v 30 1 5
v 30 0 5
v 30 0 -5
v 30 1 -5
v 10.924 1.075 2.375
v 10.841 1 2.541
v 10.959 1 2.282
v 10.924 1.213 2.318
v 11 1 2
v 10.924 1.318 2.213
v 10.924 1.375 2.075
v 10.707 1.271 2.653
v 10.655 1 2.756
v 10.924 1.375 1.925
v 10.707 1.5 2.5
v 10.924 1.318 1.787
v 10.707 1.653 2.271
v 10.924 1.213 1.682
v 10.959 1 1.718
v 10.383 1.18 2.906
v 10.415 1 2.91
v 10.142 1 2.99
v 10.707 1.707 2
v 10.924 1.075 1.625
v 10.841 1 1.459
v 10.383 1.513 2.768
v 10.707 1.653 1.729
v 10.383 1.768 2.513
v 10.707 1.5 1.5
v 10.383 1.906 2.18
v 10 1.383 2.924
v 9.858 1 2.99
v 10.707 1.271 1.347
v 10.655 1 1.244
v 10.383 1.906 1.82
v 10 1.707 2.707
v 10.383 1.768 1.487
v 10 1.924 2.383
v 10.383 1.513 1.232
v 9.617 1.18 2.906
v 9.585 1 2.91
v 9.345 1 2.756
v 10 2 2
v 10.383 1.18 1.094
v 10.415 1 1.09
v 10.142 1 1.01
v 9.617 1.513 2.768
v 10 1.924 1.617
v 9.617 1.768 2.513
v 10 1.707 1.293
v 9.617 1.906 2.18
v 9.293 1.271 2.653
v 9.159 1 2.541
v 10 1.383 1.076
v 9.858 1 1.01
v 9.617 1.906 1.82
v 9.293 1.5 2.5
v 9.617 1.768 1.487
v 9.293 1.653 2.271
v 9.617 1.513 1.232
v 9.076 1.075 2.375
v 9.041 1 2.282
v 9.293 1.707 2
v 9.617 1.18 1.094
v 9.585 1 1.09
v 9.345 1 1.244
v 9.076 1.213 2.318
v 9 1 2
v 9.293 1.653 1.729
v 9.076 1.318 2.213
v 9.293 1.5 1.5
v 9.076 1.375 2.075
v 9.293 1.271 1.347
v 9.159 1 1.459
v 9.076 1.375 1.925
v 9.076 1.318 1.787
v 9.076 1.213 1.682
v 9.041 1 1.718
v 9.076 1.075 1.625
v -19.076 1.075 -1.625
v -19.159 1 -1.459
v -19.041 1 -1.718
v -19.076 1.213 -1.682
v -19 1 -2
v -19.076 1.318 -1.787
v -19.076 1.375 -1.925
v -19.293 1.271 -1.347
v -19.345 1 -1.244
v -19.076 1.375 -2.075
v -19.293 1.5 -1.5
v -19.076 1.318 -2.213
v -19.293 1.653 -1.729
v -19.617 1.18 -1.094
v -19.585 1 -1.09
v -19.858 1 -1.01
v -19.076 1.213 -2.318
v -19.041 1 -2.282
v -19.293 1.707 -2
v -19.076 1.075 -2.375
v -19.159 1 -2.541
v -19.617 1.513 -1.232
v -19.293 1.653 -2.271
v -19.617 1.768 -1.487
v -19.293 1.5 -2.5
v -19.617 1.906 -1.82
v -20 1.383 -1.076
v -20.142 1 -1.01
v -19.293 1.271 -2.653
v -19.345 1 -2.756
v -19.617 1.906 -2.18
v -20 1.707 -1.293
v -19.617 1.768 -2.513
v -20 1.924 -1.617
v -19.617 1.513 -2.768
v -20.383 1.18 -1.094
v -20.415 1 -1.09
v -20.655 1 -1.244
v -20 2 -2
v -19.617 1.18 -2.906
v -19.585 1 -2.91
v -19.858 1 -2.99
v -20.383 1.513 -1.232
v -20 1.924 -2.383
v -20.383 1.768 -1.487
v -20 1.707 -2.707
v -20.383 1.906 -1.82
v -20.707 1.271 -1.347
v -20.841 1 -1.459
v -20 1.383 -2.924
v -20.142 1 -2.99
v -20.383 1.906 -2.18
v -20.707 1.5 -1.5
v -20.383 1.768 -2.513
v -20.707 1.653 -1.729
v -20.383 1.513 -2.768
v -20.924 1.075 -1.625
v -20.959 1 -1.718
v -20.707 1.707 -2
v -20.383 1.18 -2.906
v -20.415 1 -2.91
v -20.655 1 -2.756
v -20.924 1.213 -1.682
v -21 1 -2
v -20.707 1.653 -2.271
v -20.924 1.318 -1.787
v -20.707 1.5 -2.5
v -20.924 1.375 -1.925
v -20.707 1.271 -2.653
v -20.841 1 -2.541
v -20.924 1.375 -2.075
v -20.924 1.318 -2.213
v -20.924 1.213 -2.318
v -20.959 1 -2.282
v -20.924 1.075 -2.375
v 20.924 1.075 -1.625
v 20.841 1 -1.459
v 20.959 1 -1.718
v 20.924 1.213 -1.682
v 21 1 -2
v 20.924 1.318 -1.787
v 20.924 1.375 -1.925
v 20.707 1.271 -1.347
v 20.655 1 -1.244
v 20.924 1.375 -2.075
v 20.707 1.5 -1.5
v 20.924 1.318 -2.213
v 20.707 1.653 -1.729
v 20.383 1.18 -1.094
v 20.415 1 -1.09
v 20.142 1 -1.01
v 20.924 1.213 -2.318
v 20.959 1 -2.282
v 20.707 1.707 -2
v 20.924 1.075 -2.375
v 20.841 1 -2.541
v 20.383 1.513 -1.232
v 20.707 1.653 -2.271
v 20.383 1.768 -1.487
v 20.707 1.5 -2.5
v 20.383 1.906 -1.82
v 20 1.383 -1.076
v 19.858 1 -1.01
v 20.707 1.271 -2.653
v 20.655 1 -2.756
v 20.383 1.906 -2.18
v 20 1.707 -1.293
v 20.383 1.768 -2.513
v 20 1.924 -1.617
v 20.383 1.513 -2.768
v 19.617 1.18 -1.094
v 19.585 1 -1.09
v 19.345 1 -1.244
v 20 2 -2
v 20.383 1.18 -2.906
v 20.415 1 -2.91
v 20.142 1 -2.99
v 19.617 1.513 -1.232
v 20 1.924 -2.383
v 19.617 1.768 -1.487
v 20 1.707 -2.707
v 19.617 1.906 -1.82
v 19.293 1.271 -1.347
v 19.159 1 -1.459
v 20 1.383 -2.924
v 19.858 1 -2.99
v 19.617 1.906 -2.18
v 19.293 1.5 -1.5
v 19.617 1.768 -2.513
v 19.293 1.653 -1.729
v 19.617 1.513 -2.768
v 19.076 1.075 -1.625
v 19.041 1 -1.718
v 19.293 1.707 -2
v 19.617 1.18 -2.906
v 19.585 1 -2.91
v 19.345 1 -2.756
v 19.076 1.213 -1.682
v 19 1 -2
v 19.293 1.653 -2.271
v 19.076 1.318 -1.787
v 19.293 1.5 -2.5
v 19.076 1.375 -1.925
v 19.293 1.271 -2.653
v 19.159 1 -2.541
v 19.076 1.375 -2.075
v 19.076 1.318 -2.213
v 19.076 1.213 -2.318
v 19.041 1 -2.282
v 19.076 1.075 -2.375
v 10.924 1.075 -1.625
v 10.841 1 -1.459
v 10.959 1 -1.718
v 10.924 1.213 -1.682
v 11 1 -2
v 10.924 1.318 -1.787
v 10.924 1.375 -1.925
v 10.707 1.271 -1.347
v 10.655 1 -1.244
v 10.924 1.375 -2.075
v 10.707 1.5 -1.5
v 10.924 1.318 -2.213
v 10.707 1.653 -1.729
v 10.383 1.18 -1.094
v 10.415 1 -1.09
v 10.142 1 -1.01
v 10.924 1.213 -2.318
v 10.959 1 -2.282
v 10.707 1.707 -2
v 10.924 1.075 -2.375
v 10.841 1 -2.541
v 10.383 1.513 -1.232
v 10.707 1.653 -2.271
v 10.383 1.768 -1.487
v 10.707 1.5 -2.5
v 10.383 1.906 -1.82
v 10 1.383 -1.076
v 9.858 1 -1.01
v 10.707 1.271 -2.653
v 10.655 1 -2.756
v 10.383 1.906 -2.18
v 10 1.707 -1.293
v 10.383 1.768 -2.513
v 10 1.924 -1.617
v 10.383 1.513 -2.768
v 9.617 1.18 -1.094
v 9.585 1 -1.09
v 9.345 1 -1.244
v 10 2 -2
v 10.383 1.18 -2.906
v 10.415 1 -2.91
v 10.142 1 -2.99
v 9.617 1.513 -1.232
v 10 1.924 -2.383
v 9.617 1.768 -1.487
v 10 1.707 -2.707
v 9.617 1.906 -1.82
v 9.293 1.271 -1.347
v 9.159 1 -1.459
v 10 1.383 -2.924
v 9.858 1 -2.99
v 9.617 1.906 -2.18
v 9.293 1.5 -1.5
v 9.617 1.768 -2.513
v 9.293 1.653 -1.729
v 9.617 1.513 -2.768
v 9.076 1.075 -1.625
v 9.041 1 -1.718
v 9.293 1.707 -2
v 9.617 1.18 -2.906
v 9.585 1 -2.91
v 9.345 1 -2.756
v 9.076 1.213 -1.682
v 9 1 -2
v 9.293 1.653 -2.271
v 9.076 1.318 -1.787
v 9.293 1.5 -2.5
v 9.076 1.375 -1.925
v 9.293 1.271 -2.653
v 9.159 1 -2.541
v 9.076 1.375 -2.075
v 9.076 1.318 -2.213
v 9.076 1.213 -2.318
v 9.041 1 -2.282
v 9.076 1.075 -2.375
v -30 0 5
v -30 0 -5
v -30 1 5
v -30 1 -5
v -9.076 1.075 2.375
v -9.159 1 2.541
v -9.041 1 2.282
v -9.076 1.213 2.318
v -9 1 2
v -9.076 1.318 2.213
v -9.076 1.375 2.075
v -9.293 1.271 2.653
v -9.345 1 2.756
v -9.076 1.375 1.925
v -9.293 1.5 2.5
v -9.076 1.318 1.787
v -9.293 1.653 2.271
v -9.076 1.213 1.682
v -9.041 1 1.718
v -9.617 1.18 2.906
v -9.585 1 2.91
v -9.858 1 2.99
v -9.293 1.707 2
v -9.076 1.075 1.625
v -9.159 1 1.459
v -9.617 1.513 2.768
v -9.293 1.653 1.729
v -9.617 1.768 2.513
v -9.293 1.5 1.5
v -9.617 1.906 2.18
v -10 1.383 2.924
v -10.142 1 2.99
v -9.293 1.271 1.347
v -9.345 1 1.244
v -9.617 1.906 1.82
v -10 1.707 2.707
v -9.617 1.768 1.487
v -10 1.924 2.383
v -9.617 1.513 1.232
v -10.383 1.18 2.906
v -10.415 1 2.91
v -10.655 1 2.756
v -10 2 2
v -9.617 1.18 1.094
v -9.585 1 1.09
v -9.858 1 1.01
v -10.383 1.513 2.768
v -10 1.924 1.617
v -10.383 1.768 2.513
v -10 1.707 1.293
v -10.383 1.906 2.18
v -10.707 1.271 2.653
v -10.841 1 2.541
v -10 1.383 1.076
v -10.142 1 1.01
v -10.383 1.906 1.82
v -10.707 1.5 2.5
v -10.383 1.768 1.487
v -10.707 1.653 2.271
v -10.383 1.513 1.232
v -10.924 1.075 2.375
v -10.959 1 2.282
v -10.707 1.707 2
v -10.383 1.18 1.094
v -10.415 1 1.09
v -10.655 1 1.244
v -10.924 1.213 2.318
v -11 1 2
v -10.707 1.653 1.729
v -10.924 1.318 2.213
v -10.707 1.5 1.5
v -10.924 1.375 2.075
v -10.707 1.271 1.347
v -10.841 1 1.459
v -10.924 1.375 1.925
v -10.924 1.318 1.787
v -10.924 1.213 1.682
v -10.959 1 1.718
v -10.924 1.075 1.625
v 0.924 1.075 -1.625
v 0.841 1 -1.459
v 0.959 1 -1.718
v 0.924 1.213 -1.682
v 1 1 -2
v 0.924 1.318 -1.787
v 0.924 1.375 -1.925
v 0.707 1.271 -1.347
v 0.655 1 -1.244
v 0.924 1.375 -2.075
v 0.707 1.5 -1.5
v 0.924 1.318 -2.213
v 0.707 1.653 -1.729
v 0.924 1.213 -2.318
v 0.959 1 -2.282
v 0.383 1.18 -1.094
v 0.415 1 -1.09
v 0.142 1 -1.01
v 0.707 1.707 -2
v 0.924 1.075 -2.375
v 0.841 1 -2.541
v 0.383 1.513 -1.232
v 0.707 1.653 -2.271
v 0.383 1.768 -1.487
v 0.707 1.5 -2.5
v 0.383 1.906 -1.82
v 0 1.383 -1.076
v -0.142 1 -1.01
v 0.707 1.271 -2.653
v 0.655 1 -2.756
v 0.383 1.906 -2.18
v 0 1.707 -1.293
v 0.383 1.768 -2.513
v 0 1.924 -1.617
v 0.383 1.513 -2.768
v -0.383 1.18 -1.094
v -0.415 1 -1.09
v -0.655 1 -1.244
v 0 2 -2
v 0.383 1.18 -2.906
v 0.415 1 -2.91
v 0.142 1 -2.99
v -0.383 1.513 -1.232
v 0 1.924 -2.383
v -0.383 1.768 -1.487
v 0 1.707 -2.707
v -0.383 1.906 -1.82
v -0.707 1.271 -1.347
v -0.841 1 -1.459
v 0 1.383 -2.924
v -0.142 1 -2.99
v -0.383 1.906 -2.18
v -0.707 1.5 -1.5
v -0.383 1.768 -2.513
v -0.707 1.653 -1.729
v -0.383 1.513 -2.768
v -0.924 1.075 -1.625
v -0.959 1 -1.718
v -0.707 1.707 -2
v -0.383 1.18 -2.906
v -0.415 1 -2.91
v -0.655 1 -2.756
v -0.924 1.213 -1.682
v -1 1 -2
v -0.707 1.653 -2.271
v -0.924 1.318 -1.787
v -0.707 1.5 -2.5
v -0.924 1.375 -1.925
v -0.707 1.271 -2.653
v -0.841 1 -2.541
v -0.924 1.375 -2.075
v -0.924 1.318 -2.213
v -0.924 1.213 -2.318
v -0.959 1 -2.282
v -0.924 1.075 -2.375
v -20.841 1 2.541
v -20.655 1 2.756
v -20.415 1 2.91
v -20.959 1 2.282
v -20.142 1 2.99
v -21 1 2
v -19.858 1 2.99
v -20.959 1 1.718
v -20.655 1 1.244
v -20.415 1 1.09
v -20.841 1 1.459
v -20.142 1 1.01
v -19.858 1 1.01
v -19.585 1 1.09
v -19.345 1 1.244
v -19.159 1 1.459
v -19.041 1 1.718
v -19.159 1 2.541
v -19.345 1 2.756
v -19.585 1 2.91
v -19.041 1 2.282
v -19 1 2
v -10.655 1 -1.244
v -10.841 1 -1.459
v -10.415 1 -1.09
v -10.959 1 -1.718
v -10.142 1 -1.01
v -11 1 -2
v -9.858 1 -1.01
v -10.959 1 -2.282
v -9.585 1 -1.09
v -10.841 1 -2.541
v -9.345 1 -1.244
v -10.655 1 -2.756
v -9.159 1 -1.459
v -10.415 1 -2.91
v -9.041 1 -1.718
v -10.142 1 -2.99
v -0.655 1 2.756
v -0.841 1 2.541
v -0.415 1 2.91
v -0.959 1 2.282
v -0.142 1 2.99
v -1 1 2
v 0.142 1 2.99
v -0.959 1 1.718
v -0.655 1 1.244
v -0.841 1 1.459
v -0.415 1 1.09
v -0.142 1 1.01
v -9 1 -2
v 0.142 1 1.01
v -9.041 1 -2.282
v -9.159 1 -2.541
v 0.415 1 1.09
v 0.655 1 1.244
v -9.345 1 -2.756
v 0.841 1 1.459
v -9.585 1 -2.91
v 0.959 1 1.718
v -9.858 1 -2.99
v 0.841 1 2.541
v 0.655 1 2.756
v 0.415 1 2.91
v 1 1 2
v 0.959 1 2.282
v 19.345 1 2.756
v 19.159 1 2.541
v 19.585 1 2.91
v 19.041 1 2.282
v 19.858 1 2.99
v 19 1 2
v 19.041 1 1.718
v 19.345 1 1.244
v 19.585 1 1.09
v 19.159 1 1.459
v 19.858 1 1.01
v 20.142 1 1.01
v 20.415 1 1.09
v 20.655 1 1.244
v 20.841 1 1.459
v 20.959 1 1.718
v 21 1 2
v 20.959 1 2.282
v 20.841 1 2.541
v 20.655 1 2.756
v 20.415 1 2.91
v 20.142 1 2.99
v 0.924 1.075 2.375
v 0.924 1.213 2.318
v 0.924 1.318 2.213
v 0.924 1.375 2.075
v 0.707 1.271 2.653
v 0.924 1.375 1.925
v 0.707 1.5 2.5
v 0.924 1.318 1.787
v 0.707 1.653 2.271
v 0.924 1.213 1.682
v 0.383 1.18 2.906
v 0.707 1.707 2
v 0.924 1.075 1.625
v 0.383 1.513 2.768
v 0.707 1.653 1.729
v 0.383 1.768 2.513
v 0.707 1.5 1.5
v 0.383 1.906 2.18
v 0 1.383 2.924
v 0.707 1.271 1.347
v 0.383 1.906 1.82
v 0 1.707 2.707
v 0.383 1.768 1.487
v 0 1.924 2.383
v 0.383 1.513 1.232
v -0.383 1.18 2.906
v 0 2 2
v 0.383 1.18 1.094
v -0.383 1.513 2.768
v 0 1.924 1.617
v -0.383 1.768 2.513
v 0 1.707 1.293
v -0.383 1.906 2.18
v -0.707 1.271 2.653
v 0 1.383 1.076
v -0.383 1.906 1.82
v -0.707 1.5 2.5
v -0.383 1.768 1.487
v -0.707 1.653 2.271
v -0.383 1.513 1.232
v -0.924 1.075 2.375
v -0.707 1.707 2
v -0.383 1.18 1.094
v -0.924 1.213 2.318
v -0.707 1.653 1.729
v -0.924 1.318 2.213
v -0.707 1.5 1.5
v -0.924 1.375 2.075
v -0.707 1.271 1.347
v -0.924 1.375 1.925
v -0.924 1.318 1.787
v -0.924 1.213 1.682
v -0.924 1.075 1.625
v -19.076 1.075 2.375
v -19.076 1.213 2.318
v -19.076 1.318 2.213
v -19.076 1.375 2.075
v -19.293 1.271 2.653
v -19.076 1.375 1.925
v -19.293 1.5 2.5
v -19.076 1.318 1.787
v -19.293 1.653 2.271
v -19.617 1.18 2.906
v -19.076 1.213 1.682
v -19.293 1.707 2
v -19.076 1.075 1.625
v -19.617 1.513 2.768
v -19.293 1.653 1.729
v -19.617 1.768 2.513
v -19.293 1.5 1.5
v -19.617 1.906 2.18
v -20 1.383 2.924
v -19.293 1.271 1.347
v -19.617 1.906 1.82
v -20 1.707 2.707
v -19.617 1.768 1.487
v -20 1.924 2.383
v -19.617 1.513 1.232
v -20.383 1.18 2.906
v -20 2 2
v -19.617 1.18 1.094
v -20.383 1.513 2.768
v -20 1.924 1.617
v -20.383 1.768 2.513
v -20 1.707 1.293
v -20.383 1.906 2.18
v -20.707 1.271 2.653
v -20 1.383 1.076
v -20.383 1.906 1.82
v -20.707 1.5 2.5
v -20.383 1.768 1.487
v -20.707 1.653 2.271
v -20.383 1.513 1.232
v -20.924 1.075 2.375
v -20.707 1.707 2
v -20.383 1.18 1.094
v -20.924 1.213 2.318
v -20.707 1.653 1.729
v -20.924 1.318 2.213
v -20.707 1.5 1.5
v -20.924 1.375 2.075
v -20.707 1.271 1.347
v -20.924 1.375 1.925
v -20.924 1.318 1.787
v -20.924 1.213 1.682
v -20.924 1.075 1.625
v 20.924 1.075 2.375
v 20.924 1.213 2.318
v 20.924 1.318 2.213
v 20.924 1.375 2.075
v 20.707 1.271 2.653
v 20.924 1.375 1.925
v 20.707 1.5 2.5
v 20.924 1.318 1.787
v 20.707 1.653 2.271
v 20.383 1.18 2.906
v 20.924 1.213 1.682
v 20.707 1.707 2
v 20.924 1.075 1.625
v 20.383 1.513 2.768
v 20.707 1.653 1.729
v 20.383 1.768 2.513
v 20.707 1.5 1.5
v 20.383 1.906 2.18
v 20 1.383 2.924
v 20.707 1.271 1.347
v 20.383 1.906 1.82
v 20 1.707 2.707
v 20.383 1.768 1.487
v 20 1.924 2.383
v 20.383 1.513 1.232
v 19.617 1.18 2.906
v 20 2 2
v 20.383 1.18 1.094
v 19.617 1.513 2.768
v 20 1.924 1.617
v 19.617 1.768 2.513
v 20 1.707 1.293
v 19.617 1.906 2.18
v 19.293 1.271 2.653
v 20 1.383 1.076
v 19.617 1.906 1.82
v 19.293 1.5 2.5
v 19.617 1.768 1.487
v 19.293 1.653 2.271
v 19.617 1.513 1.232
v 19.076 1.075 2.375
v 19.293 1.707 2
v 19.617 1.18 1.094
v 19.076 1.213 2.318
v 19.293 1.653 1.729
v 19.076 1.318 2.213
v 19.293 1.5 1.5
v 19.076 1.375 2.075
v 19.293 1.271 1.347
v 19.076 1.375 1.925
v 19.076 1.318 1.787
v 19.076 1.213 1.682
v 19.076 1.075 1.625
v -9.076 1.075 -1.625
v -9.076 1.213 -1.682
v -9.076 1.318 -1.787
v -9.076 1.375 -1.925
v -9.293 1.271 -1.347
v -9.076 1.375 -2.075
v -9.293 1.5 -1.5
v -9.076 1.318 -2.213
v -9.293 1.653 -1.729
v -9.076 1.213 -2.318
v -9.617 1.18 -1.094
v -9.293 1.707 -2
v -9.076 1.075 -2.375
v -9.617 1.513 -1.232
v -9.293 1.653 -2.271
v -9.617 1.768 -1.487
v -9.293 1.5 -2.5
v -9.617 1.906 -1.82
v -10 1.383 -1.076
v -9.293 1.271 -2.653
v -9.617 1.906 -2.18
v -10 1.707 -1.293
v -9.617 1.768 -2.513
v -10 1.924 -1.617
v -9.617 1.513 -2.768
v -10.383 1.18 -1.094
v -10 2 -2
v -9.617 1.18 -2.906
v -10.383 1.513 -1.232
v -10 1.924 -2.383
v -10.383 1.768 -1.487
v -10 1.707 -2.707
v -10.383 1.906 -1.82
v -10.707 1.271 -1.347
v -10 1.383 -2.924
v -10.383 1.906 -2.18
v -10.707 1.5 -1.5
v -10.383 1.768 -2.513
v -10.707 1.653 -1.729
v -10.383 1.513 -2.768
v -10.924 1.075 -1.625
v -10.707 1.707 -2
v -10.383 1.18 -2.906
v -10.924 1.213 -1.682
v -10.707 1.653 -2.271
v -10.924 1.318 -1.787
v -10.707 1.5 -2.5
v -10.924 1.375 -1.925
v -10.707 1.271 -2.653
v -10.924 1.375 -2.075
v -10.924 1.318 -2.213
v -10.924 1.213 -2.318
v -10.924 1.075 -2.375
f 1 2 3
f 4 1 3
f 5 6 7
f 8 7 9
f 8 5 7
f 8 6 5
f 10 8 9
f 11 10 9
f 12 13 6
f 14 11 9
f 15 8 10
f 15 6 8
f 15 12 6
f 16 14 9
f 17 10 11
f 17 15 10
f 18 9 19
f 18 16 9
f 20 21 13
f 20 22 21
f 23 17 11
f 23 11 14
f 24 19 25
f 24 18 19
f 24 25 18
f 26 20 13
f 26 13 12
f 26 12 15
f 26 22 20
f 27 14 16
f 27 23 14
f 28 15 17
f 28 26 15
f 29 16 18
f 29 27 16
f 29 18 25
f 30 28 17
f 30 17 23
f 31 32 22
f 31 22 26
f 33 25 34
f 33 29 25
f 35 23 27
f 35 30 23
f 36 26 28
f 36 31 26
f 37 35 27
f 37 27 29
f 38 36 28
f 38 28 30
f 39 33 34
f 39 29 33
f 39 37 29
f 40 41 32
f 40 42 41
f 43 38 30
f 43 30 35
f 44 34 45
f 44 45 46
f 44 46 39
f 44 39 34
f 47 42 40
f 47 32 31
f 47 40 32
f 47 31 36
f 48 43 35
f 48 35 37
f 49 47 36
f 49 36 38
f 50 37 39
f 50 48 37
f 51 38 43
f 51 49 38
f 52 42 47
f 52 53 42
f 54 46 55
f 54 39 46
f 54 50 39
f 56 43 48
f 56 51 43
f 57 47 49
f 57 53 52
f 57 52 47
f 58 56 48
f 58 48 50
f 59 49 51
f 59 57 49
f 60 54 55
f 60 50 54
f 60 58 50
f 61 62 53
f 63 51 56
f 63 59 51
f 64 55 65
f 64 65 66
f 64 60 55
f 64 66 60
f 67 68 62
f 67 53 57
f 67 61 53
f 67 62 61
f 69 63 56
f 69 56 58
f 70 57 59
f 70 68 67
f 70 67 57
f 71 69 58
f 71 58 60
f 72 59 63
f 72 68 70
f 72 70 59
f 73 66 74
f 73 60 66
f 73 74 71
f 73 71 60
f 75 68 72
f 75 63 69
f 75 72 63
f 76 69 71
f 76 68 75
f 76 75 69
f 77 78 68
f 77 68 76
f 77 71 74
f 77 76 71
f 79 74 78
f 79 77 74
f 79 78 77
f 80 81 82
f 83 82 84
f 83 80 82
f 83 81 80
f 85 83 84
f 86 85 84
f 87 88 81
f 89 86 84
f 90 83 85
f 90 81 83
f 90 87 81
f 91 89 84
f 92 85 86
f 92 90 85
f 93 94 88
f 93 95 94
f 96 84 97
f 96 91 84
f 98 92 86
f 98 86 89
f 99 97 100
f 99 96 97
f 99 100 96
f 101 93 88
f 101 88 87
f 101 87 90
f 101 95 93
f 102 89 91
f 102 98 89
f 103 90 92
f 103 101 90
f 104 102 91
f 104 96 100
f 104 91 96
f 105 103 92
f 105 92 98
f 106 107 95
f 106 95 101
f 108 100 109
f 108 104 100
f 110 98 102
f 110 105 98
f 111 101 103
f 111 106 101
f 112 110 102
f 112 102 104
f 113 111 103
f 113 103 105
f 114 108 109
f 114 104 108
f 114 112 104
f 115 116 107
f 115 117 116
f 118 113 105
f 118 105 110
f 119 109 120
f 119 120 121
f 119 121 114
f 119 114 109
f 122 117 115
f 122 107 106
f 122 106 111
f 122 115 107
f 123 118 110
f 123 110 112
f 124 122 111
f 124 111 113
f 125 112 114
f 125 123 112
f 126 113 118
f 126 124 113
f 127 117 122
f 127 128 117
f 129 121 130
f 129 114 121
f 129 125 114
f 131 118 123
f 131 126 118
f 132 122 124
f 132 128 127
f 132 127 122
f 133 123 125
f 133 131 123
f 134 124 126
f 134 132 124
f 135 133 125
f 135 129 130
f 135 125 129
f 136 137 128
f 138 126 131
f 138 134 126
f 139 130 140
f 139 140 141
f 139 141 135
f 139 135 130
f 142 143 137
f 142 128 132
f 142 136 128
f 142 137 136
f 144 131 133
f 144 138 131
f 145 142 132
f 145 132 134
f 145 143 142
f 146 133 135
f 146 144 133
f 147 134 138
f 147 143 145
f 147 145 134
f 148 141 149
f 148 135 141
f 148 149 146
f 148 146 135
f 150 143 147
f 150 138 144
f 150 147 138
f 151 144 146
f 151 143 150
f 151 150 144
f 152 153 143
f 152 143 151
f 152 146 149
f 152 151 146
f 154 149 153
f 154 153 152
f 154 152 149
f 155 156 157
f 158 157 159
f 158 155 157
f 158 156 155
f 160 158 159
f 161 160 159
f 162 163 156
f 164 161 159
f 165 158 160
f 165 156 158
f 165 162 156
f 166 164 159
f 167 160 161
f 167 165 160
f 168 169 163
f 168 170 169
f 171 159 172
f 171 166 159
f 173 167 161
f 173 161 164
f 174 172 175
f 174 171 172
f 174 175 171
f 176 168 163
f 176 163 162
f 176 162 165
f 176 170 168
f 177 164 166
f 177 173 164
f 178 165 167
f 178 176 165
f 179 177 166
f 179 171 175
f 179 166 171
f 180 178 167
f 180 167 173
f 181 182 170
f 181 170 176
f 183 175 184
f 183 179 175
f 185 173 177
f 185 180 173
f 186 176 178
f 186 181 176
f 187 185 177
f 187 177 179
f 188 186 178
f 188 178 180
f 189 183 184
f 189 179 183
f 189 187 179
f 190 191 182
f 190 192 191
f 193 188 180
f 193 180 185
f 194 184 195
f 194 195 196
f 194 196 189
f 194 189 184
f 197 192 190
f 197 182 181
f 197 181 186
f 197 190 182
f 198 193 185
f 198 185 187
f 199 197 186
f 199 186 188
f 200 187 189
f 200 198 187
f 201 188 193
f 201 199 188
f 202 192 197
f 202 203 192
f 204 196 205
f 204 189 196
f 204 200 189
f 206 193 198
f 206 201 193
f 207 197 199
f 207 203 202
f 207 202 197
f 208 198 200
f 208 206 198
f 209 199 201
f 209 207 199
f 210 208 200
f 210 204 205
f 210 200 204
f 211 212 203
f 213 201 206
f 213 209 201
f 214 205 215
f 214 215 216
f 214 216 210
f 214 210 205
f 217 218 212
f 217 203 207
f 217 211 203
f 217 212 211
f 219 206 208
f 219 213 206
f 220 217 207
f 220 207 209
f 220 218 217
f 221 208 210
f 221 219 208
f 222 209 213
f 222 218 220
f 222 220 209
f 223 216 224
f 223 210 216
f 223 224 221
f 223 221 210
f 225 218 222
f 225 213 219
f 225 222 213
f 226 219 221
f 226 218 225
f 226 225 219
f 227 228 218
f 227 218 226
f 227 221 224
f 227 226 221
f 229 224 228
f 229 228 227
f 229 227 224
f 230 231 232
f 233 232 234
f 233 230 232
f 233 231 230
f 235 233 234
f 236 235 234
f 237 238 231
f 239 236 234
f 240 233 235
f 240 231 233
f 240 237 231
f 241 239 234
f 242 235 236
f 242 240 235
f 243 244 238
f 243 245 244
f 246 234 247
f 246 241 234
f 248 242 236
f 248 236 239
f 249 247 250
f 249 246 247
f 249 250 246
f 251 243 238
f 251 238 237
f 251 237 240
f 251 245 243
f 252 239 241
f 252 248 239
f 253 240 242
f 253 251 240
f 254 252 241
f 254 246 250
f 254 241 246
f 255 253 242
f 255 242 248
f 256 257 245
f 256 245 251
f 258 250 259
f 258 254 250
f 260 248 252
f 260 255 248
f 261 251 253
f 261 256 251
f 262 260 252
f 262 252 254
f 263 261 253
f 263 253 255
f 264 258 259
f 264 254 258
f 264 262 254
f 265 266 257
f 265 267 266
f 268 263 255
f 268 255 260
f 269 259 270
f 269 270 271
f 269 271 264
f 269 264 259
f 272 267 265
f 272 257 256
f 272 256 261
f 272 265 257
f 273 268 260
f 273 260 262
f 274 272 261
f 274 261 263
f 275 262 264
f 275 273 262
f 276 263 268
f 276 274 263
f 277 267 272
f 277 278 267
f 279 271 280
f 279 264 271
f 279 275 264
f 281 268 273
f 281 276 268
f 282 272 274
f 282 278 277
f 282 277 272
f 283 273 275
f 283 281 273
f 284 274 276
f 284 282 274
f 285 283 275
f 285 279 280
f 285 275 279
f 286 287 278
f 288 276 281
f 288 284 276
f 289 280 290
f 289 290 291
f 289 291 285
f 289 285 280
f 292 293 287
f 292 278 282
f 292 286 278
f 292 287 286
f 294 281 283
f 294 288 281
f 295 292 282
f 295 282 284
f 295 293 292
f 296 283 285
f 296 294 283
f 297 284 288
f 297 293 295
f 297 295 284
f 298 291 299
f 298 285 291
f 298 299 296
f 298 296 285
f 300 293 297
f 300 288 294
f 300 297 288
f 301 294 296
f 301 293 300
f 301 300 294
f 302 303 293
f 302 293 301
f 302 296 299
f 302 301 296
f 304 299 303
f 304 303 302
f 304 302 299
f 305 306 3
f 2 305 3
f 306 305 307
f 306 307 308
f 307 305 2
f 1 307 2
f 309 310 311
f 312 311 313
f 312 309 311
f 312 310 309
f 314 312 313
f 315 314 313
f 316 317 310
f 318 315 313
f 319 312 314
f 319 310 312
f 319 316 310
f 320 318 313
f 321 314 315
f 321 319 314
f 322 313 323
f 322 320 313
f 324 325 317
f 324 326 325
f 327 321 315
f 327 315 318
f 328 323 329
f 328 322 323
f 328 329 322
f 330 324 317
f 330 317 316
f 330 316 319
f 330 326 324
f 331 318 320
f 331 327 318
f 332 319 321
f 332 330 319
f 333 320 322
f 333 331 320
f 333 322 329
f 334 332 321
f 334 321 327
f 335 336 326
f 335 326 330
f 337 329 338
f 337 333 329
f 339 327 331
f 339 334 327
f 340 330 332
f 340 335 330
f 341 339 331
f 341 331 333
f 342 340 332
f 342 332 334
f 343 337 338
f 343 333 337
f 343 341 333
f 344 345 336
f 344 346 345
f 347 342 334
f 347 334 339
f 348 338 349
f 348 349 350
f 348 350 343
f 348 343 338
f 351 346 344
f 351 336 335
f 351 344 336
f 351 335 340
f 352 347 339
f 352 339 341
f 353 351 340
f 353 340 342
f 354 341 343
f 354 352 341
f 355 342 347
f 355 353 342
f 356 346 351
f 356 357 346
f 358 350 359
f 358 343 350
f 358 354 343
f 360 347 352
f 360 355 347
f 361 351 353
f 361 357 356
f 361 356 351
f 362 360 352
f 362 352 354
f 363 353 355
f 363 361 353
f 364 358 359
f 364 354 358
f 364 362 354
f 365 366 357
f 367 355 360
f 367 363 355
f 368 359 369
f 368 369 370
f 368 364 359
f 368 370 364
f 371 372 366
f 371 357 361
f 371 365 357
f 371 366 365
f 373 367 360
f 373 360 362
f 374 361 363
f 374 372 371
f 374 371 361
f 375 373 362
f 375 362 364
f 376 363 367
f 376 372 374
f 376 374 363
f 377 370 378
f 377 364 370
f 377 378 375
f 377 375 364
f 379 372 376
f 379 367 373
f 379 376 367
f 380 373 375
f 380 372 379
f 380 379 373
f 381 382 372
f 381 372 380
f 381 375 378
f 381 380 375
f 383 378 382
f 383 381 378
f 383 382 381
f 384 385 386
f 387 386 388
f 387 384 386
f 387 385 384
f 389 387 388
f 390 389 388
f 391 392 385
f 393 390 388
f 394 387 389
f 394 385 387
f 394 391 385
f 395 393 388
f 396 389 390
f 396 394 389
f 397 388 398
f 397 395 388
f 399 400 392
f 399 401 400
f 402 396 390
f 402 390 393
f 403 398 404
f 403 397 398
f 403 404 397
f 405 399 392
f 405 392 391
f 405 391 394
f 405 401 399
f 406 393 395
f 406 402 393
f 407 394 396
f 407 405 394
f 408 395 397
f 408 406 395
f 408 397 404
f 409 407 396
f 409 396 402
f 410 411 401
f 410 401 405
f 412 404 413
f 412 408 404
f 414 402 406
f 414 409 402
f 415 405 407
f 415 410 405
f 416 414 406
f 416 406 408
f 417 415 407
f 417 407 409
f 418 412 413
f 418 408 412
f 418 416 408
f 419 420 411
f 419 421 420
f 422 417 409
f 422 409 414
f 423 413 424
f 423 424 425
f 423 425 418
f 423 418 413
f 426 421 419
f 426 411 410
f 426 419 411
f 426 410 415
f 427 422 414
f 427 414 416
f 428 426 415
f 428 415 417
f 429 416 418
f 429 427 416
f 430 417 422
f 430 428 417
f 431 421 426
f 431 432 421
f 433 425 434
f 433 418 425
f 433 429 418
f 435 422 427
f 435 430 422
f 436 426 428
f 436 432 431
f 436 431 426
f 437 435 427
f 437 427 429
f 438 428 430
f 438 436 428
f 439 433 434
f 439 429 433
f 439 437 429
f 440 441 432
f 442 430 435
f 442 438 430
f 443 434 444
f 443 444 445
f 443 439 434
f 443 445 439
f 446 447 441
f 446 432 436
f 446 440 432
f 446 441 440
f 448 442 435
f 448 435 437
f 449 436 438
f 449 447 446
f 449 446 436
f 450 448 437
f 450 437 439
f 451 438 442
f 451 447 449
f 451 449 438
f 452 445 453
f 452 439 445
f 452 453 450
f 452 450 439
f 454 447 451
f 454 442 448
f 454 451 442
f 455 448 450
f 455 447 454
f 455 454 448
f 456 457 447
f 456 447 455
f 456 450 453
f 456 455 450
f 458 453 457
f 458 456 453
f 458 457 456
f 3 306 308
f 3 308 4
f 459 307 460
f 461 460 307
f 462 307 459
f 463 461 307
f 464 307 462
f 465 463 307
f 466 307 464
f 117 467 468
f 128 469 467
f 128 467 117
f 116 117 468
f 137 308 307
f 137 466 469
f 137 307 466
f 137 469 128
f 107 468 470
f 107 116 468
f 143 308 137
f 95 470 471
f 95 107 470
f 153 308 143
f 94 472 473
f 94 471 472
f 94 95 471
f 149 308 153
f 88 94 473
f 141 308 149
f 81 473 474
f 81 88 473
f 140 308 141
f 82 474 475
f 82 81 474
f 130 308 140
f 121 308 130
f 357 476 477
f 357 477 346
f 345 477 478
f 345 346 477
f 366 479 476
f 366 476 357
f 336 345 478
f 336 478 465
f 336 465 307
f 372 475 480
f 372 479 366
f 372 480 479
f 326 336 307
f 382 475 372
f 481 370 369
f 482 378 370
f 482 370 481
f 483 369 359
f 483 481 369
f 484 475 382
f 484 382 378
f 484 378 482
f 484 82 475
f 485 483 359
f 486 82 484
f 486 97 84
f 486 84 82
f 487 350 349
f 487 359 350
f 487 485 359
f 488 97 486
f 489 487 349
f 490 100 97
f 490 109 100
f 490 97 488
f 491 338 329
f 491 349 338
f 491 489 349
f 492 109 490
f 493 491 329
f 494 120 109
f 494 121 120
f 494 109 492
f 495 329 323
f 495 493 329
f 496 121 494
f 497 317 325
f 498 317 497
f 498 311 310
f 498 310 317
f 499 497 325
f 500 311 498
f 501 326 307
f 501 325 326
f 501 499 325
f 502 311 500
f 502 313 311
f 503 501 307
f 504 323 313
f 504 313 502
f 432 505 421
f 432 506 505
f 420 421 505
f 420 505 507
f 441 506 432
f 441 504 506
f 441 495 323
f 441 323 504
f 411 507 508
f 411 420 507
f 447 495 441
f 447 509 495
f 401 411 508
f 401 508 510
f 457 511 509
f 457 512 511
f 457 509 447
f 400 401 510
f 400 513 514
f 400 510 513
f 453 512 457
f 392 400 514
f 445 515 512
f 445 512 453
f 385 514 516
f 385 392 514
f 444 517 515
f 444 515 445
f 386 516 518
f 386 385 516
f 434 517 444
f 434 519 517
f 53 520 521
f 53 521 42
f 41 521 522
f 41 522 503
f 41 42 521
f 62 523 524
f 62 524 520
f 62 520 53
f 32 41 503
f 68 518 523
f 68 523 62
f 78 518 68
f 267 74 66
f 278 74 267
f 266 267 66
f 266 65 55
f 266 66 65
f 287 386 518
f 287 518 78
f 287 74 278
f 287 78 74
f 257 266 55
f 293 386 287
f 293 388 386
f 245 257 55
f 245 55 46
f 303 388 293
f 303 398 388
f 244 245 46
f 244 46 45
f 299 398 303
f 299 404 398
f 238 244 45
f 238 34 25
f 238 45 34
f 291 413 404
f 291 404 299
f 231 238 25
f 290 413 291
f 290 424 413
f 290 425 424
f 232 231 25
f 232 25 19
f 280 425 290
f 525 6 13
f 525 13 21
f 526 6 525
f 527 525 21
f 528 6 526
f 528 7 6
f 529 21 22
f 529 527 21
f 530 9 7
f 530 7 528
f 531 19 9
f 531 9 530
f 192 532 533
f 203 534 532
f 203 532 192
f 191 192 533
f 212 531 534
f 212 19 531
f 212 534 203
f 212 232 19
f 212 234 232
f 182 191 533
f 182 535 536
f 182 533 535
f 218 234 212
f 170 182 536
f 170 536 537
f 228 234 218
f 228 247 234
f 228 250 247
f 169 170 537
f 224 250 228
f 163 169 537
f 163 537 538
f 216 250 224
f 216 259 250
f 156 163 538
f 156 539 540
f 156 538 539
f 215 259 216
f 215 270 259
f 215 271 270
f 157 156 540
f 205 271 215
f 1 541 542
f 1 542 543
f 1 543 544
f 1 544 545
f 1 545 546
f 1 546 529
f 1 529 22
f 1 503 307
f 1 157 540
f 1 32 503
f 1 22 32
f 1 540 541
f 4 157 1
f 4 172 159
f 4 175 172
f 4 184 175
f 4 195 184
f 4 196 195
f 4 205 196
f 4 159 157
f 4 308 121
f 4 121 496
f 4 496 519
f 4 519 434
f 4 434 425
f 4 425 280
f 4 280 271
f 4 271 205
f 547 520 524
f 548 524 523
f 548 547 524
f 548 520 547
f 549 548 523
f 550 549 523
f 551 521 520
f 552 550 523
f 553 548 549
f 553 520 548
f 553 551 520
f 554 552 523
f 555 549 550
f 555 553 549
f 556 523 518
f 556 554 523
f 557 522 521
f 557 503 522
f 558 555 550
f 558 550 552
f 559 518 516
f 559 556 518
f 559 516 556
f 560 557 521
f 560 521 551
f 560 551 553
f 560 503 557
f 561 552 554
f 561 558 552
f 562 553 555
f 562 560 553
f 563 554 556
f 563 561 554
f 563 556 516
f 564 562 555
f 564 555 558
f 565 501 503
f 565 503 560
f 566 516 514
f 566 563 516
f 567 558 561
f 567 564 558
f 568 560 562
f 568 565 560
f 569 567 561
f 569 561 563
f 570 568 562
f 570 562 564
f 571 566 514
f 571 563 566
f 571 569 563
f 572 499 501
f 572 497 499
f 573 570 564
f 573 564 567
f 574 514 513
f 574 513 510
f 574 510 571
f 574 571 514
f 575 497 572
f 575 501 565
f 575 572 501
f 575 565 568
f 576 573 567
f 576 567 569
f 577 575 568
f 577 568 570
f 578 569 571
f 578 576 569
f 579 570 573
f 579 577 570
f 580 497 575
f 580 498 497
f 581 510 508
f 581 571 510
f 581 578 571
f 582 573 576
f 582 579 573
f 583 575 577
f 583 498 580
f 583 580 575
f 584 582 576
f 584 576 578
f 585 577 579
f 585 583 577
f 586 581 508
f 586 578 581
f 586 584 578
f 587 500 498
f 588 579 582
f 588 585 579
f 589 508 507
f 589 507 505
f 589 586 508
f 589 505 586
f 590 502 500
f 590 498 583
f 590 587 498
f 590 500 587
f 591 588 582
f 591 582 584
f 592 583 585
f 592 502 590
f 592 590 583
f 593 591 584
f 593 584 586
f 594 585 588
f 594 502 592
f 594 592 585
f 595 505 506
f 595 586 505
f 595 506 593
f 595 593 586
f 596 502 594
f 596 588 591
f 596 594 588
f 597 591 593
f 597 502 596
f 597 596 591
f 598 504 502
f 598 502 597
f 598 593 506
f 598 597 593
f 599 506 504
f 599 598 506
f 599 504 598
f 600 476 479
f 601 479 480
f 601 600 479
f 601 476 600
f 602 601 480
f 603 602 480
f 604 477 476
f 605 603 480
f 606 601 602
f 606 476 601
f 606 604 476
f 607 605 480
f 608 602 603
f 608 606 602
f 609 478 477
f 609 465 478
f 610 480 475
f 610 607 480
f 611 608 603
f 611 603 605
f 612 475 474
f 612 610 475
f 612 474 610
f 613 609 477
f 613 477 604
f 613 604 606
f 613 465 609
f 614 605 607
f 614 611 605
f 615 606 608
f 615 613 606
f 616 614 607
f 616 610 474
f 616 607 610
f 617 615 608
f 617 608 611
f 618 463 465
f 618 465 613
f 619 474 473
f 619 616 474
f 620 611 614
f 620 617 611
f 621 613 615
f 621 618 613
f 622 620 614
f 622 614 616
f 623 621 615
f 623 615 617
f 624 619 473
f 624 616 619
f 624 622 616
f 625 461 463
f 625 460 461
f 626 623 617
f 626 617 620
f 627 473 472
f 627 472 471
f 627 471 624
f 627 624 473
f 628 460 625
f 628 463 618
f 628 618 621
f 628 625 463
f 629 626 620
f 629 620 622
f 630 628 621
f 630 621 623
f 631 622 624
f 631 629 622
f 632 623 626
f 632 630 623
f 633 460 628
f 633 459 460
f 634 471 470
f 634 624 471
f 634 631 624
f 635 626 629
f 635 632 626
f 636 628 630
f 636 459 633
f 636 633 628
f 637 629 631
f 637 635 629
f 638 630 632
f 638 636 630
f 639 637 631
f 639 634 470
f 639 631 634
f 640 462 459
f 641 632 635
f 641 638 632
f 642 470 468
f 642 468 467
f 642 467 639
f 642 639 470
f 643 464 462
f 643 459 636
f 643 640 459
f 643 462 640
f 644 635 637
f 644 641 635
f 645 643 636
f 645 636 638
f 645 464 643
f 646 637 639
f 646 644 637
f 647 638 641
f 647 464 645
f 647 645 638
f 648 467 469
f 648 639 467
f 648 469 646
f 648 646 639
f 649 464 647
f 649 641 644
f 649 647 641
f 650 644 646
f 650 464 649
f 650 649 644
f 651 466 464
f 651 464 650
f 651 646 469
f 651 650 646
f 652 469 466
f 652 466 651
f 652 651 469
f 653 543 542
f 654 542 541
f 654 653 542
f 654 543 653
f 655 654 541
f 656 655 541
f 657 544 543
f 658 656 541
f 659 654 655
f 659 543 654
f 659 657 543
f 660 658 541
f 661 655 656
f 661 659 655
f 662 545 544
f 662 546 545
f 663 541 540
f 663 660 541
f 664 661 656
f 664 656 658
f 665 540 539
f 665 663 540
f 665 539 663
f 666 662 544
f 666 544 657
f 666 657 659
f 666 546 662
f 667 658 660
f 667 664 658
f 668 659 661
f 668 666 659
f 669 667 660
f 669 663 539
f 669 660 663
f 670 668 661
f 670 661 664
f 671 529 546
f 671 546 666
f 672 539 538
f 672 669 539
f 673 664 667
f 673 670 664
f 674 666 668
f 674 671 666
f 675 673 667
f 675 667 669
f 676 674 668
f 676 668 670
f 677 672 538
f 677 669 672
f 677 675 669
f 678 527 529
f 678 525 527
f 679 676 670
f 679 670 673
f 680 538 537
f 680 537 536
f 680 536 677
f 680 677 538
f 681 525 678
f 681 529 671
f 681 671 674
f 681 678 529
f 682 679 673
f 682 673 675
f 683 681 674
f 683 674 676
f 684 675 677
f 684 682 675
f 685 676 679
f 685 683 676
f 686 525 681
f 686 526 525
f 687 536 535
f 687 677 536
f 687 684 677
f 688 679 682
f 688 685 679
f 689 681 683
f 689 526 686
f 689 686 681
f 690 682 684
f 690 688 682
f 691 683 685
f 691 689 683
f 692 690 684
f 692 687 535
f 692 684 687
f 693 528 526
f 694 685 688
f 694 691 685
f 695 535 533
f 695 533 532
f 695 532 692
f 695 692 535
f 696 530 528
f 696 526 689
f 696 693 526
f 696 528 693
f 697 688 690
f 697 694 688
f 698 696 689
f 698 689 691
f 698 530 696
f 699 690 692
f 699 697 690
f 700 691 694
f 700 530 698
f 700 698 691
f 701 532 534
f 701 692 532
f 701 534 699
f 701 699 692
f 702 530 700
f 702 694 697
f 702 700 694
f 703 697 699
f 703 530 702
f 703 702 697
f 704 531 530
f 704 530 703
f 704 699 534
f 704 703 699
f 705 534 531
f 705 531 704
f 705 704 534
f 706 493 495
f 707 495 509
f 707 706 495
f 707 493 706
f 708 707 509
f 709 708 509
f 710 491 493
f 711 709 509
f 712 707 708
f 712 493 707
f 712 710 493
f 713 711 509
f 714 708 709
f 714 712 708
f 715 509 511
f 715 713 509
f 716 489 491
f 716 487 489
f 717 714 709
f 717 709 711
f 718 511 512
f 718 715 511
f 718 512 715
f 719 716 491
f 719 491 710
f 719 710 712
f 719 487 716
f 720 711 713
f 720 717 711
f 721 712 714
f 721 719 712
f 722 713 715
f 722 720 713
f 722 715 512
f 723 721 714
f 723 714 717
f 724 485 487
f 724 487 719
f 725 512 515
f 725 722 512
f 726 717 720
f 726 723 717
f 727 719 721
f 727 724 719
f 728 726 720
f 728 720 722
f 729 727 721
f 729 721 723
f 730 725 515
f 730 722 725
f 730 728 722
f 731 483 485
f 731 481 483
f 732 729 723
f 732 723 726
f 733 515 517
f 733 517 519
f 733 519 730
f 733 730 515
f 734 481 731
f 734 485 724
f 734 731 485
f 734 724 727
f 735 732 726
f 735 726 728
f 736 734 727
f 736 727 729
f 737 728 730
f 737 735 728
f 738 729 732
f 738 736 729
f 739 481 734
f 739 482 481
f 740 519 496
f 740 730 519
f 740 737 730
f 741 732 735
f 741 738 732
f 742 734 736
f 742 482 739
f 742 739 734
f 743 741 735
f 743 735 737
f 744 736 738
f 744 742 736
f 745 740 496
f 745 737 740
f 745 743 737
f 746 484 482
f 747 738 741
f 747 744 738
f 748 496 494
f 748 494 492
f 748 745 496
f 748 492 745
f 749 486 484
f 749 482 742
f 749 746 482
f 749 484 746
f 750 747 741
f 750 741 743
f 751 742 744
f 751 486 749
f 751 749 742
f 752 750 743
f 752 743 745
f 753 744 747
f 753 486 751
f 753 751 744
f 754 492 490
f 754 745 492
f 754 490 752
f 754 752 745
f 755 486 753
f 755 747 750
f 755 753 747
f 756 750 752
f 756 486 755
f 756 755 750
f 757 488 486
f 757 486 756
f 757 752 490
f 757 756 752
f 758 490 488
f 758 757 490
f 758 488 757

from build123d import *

# Parameters (mm, degrees)
SKETCH1_W               = 60
SKETCH1_H               = 10
BOSS_EXTRUDE1_DEPTH     = 1
REVOLVE1_ANGLE          = 180
LPATTERN1_COUNT         = 3
LPATTERN1_PITCH         = 10
LPATTERN1_COUNT_DIR2    = 2
LPATTERN1_PITCH_DIR2    = 4
LPATTERN2_COUNT         = 3
LPATTERN2_PITCH         = 10
LPATTERN2_COPY_1_ANGLE  = 180
LPATTERN2_COPY_2_ANGLE  = 180
LPATTERN2_COPY_3_ANGLE  = 180
LPATTERN2_COPY_4_ANGLE  = 180
LPATTERN2_COPY_5_ANGLE  = 180
LPATTERN2_COPY_6_ANGLE  = 180
LPATTERN2_COPY_7_ANGLE  = 180
LPATTERN2_COPY_8_ANGLE  = 180
LPATTERN2_COPY_9_ANGLE  = 180
LPATTERN2_COPY_10_ANGLE = 180


with BuildPart() as part:
    # Sketch1 → Boss-Extrude1 (new body)
    with BuildSketch(Plane(origin=(0, 0, 0), x_dir=(1, 0, 0), z_dir=(0, 1, 0))):
        Rectangle(SKETCH1_W, SKETCH1_H)
    extrude(amount=BOSS_EXTRUDE1_DEPTH)

    # Sketch3 → Revolve1 (revolve)
    with BuildSketch(Plane(origin=(0, 1, 0), x_dir=(1, 0, 0), z_dir=(0, 1, 0))):
        with BuildLine():
            Line((-1, -2), (1, -2))
            ThreePointArc((1, -2), (0, -3), (-1, -2))
        make_face()
    revolve1 = revolve(axis=Axis((-1, 1, 2), (-1, 0, 0)), revolution_arc=REVOLVE1_ANGLE)

    # LPattern1: Revolve1 3 × 2
    with Locations(*[(-i * LPATTERN1_PITCH, 0, -j * LPATTERN1_PITCH_DIR2) for i in range(LPATTERN1_COUNT) for j in range(LPATTERN1_COUNT_DIR2) if (i, j) != (0, 0)]):
        add(revolve1)

    # LPattern2: Revolve1 ×3
    with Locations(*[(i * LPATTERN2_PITCH, 0, 0) for i in range(1, LPATTERN2_COUNT)]):
        add(revolve1)

    # LPattern2 copy 1 sketch → LPattern2 copy 1 (revolve)
    with BuildSketch(Plane(origin=(10, 1, -4), x_dir=(1, 0, 0), z_dir=(0, 1, 0))):
        with BuildLine():
            Line((-1, -2), (1, -2))
            ThreePointArc((1, -2), (0, -3), (-1, -2))
        make_face()
    revolve(axis=Axis((9, 1, -2), (-1, 0, 0)), revolution_arc=LPATTERN2_COPY_1_ANGLE)

    # LPattern2 copy 2 sketch → LPattern2 copy 2 (revolve)
    with BuildSketch(Plane(origin=(20, 1, -4), x_dir=(1, 0, 0), z_dir=(0, 1, 0))):
        with BuildLine():
            Line((-1, -2), (1, -2))
            ThreePointArc((1, -2), (0, -3), (-1, -2))
        make_face()
    revolve(axis=Axis((19, 1, -2), (-1, 0, 0)), revolution_arc=LPATTERN2_COPY_2_ANGLE)

    # LPattern2 copy 3 sketch → LPattern2 copy 3 (revolve)
    with BuildSketch(Plane(origin=(0, 1, 0), x_dir=(1, 0, 0), z_dir=(0, 1, 0))):
        with BuildLine():
            Line((-1, -2), (1, -2))
            ThreePointArc((1, -2), (0, -3), (-1, -2))
        make_face()
    revolve(axis=Axis((-1, 1, 2), (-1, 0, 0)), revolution_arc=LPATTERN2_COPY_3_ANGLE)

    # LPattern2 copy 4 sketch → LPattern2 copy 4 (revolve)
    with BuildSketch(Plane(origin=(10, 1, 0), x_dir=(1, 0, 0), z_dir=(0, 1, 0))):
        with BuildLine():
            Line((-1, -2), (1, -2))
            ThreePointArc((1, -2), (0, -3), (-1, -2))
        make_face()
    revolve(axis=Axis((9, 1, 2), (-1, 0, 0)), revolution_arc=LPATTERN2_COPY_4_ANGLE)

    # LPattern2 copy 5 sketch → LPattern2 copy 5 (revolve)
    with BuildSketch(Plane(origin=(0, 1, -4), x_dir=(1, 0, 0), z_dir=(0, 1, 0))):
        with BuildLine():
            Line((-1, -2), (1, -2))
            ThreePointArc((1, -2), (0, -3), (-1, -2))
        make_face()
    revolve(axis=Axis((-1, 1, -2), (-1, 0, 0)), revolution_arc=LPATTERN2_COPY_5_ANGLE)

    # LPattern2 copy 6 sketch → LPattern2 copy 6 (revolve)
    with BuildSketch(Plane(origin=(10, 1, -4), x_dir=(1, 0, 0), z_dir=(0, 1, 0))):
        with BuildLine():
            Line((-1, -2), (1, -2))
            ThreePointArc((1, -2), (0, -3), (-1, -2))
        make_face()
    revolve(axis=Axis((9, 1, -2), (-1, 0, 0)), revolution_arc=LPATTERN2_COPY_6_ANGLE)

    # LPattern2 copy 7 sketch → LPattern2 copy 7 (revolve)
    with BuildSketch(Plane(origin=(-10, 1, 0), x_dir=(1, 0, 0), z_dir=(0, 1, 0))):
        with BuildLine():
            Line((-1, -2), (1, -2))
            ThreePointArc((1, -2), (0, -3), (-1, -2))
        make_face()
    revolve(axis=Axis((-11, 1, 2), (-1, 0, 0)), revolution_arc=LPATTERN2_COPY_7_ANGLE)

    # LPattern2 copy 8 sketch → LPattern2 copy 8 (revolve)
    with BuildSketch(Plane(origin=(0, 1, 0), x_dir=(1, 0, 0), z_dir=(0, 1, 0))):
        with BuildLine():
            Line((-1, -2), (1, -2))
            ThreePointArc((1, -2), (0, -3), (-1, -2))
        make_face()
    revolve(axis=Axis((-1, 1, 2), (-1, 0, 0)), revolution_arc=LPATTERN2_COPY_8_ANGLE)

    # LPattern2 copy 9 sketch → LPattern2 copy 9 (revolve)
    with BuildSketch(Plane(origin=(-10, 1, -4), x_dir=(1, 0, 0), z_dir=(0, 1, 0))):
        with BuildLine():
            Line((-1, -2), (1, -2))
            ThreePointArc((1, -2), (0, -3), (-1, -2))
        make_face()
    revolve(axis=Axis((-11, 1, -2), (-1, 0, 0)), revolution_arc=LPATTERN2_COPY_9_ANGLE)

    # LPattern2 copy 10 sketch → LPattern2 copy 10 (revolve)
    with BuildSketch(Plane(origin=(0, 1, -4), x_dir=(1, 0, 0), z_dir=(0, 1, 0))):
        with BuildLine():
            Line((-1, -2), (1, -2))
            ThreePointArc((1, -2), (0, -3), (-1, -2))
        make_face()
    revolve(axis=Axis((-1, 1, -2), (-1, 0, 0)), revolution_arc=LPATTERN2_COPY_10_ANGLE)


solid = part.part
